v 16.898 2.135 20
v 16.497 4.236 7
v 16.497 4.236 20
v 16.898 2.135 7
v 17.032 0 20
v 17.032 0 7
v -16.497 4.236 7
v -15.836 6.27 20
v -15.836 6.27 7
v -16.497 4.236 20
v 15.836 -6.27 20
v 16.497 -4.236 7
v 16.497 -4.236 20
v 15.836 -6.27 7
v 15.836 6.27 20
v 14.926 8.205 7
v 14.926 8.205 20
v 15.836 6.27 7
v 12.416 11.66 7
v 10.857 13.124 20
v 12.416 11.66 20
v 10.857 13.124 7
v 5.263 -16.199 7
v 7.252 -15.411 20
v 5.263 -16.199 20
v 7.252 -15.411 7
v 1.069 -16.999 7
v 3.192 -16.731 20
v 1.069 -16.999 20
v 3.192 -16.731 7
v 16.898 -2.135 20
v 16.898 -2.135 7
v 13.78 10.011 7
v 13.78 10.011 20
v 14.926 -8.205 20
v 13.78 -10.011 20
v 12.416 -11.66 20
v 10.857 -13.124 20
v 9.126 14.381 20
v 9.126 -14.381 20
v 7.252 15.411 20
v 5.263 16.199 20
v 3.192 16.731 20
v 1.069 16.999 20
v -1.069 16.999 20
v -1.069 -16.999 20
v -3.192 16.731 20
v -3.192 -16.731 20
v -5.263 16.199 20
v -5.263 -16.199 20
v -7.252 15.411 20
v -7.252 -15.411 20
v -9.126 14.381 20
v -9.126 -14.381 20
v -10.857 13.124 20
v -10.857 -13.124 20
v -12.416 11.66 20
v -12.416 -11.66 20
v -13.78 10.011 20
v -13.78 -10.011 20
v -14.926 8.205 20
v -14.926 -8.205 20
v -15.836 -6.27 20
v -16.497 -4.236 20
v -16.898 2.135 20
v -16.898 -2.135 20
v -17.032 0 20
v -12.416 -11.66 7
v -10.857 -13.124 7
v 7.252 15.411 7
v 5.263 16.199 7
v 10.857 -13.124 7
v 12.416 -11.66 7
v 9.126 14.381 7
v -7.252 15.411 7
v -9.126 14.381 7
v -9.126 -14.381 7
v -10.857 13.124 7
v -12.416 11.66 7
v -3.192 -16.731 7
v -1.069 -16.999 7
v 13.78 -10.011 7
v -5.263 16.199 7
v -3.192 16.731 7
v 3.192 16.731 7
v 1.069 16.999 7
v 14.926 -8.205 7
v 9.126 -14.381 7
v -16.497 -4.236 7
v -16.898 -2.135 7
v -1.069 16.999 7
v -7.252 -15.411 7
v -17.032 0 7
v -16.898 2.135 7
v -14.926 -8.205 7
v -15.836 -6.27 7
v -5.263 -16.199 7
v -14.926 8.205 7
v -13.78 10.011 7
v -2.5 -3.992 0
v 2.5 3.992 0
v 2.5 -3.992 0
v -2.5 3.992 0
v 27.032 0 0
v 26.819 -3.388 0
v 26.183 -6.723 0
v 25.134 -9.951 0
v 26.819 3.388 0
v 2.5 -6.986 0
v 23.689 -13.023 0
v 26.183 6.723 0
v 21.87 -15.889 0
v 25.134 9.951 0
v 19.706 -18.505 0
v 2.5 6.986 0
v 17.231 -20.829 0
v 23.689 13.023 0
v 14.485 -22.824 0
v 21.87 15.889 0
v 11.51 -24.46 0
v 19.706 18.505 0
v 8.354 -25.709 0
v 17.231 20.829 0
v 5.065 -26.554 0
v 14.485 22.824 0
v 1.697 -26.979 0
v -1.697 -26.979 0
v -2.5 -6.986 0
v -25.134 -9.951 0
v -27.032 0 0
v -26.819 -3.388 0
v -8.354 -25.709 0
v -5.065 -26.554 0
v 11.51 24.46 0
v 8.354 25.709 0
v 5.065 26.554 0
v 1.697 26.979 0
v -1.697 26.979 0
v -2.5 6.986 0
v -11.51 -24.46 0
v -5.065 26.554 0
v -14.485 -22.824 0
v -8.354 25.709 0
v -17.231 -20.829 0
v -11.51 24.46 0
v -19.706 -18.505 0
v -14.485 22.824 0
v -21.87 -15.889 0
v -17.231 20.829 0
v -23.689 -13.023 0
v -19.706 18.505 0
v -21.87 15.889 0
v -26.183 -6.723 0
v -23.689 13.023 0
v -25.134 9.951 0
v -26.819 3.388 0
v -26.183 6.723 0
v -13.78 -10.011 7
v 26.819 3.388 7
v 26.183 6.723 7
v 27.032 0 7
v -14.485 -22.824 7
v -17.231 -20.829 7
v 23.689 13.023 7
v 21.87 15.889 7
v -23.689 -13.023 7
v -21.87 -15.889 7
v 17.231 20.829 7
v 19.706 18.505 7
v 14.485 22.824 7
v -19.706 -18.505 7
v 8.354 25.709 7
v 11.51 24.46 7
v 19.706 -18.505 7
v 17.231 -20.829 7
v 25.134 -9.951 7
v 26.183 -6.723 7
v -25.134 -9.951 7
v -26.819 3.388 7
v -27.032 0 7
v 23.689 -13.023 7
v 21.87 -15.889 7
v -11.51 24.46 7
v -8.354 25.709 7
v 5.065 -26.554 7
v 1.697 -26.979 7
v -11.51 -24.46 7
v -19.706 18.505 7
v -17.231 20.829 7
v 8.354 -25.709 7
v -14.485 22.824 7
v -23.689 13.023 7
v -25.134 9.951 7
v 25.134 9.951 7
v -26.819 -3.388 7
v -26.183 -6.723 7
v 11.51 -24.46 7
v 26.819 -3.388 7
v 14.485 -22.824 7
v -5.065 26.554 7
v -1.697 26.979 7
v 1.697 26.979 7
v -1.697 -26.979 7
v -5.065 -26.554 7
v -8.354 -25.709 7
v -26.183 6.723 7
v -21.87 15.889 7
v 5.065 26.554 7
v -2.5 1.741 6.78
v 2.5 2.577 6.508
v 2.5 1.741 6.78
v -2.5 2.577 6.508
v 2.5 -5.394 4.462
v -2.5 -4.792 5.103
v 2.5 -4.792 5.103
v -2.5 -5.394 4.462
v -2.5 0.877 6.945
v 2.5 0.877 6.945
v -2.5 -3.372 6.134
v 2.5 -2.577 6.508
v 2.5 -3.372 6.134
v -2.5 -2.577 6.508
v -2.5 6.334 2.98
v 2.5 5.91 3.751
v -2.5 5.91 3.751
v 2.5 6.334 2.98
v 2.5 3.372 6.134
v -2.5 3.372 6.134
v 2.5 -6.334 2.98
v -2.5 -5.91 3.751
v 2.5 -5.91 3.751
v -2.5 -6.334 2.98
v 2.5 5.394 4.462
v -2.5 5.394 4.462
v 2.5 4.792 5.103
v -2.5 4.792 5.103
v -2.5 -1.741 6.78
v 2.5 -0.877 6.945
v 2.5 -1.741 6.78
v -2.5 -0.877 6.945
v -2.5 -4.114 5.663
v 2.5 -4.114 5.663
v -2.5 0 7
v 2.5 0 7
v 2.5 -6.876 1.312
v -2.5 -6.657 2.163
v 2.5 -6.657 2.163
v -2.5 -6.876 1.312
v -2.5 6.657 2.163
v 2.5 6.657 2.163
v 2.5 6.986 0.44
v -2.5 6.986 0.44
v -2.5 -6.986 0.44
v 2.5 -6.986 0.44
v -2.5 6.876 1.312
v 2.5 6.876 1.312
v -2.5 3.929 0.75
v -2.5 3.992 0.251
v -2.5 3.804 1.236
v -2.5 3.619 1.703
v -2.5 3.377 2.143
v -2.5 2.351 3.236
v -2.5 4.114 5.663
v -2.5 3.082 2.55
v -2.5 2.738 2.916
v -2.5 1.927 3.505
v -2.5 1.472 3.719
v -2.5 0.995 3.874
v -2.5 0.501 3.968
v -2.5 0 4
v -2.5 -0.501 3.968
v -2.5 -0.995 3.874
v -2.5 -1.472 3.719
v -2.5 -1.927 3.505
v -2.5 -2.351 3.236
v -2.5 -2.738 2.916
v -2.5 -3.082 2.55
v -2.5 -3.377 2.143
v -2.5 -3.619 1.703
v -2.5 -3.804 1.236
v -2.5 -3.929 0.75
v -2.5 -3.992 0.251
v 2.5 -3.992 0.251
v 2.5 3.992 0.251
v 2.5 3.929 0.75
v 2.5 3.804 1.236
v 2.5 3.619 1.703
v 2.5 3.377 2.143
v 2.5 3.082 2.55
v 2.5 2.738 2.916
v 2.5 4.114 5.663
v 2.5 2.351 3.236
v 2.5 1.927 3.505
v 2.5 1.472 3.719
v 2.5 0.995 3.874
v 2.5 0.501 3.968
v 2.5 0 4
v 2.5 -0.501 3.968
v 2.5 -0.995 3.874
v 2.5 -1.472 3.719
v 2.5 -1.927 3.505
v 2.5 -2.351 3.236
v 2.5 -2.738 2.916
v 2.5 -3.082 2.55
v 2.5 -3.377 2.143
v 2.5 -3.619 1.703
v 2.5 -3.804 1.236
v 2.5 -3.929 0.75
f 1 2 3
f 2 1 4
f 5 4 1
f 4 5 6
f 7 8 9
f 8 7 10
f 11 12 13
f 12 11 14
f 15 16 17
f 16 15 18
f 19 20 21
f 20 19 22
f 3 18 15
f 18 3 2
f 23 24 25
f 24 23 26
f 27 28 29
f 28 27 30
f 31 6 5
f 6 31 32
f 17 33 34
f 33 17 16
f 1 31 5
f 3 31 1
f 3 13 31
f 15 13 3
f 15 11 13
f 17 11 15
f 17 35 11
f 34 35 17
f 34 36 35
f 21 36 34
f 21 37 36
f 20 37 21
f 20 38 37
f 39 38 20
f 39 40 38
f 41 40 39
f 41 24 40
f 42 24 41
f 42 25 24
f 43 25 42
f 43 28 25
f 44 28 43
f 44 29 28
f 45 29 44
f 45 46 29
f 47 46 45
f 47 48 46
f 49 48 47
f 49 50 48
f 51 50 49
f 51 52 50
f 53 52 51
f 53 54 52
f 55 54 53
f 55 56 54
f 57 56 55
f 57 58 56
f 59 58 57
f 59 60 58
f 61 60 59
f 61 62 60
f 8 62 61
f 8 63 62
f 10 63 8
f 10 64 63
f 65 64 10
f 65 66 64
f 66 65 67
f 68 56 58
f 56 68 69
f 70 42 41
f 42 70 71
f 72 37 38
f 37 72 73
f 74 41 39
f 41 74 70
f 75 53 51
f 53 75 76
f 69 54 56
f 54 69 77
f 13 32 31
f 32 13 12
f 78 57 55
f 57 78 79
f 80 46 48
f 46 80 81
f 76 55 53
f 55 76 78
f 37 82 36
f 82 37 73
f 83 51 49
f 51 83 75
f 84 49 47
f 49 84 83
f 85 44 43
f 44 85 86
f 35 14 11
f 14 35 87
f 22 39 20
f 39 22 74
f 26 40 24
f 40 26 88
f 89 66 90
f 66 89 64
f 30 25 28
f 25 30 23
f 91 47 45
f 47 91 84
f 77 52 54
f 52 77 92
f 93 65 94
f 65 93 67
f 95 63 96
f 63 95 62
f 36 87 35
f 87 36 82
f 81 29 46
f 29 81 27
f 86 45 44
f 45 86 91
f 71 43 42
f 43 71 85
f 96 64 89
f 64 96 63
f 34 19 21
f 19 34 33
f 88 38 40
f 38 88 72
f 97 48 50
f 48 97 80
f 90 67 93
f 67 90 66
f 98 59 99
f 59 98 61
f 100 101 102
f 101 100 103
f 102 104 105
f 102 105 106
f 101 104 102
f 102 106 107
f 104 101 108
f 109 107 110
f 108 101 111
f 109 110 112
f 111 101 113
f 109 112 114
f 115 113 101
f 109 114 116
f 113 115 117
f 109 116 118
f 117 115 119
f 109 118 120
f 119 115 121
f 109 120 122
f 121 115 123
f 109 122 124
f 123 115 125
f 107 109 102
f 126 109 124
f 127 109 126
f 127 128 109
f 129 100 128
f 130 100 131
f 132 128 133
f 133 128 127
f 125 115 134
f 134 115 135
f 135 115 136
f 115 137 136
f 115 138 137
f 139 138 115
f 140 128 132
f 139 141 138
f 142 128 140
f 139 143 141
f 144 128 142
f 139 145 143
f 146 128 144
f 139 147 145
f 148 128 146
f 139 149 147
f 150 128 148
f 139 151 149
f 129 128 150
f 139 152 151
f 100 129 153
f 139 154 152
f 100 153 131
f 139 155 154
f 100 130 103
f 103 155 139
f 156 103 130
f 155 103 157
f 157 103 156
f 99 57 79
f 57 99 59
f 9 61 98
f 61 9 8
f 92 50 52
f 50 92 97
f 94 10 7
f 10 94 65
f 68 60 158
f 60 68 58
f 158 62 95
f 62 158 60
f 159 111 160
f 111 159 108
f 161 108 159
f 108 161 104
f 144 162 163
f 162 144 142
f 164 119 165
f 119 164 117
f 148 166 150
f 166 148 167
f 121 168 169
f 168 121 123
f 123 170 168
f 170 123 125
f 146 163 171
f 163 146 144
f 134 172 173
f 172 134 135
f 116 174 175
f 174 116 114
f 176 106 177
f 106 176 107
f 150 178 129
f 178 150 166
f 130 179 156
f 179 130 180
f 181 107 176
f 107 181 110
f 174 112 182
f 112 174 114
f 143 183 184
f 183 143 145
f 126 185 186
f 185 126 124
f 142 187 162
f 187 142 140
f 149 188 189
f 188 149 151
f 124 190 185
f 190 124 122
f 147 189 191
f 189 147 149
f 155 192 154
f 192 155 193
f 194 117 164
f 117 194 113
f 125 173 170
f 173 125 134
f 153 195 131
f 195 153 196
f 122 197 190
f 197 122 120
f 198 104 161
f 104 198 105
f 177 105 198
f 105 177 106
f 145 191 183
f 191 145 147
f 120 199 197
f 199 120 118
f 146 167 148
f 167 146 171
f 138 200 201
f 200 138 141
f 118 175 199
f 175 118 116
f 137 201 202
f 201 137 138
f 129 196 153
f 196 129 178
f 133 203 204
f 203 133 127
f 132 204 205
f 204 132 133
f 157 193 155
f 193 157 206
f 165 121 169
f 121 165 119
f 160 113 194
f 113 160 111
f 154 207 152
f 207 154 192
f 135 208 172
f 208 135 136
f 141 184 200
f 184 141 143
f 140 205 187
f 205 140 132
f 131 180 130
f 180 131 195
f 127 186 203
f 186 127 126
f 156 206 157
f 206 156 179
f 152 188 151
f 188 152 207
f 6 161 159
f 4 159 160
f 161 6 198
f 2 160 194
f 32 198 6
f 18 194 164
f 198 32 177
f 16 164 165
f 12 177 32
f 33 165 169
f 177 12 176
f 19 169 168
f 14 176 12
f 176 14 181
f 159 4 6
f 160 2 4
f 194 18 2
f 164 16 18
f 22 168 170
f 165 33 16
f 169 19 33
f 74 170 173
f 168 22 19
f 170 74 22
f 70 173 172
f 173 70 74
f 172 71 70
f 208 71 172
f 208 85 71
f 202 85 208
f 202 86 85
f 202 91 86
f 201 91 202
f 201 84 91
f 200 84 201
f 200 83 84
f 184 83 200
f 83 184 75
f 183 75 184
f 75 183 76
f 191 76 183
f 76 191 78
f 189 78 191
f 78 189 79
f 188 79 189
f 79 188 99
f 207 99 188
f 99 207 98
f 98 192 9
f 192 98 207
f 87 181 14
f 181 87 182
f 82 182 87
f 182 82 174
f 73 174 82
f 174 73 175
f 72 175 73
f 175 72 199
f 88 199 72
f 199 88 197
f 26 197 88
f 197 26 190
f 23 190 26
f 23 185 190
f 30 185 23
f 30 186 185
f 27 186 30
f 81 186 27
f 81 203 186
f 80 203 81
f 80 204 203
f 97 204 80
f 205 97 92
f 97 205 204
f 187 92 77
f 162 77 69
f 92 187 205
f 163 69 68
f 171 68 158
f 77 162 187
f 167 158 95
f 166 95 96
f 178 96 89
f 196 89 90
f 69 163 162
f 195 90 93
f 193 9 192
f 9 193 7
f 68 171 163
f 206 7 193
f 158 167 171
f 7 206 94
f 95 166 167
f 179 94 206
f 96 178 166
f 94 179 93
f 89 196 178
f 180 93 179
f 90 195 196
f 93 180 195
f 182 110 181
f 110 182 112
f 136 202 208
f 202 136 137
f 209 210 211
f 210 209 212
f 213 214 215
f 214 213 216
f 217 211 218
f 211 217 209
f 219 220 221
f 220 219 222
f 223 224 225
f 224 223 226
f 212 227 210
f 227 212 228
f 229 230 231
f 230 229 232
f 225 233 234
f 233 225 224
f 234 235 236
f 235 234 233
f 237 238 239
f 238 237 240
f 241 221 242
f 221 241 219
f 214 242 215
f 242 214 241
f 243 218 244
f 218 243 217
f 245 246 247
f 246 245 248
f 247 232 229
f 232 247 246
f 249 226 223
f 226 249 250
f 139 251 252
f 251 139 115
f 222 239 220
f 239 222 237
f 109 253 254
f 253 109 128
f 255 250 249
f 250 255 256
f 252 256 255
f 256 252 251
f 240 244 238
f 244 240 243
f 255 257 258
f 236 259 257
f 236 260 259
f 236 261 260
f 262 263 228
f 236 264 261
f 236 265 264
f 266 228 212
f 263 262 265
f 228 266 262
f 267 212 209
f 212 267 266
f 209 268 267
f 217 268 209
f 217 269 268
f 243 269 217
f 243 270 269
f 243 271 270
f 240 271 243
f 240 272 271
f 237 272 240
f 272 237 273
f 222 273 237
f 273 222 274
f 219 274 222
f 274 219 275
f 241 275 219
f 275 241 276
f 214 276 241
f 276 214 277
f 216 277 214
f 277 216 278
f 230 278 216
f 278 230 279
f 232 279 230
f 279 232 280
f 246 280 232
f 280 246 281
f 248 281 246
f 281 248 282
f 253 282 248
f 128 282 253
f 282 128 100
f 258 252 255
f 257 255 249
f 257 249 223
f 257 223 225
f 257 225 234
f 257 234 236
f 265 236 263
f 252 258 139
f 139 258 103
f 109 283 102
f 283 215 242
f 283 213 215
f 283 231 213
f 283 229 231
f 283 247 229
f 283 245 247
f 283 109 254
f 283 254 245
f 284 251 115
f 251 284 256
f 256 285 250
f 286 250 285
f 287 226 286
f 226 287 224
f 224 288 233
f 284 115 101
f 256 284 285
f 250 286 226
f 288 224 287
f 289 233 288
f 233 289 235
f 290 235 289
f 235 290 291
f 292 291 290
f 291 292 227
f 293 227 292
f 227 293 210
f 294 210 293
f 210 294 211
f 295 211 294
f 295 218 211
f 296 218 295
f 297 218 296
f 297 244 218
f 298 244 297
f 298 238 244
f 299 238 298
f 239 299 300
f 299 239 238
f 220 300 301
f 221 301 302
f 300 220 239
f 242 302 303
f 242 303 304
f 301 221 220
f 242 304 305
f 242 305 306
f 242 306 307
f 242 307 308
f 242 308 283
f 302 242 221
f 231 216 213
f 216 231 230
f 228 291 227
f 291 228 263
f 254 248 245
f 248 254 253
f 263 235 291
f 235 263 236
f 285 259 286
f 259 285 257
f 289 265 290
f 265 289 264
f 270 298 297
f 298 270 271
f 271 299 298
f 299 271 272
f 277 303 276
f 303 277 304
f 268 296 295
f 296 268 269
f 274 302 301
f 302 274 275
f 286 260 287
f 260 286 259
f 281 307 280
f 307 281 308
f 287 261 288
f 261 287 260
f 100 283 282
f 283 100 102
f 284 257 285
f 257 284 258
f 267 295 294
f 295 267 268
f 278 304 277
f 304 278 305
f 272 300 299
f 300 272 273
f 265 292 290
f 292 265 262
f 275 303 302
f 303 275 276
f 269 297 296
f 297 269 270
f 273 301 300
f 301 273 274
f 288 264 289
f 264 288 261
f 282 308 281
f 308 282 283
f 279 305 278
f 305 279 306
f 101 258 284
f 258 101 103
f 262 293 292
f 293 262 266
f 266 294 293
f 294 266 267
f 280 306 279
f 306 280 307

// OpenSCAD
inner_rad = 34.465 / 2 - 0.2;
outer_rad = inner_rad + 10;
ring_rad = 7;

render( convexity = 10 ) {

    difference () {
        union() {
            cylinder( r = inner_rad, h = 20, $fn = 50 );
            cylinder( r = outer_rad, h = 7, $fn = 50 );
        }
        translate( [ -2.5, 0, 0 ] )
            rotate ( 90, [ 0, 1, 0 ] )
                difference () {
                    cylinder( r = 7, h = 5, $fn = 50 );
                    translate( [ 0, 0, -1 ] )
                        cylinder( r = 4, h = 7, $fn = 50 );
                }
    }
}
